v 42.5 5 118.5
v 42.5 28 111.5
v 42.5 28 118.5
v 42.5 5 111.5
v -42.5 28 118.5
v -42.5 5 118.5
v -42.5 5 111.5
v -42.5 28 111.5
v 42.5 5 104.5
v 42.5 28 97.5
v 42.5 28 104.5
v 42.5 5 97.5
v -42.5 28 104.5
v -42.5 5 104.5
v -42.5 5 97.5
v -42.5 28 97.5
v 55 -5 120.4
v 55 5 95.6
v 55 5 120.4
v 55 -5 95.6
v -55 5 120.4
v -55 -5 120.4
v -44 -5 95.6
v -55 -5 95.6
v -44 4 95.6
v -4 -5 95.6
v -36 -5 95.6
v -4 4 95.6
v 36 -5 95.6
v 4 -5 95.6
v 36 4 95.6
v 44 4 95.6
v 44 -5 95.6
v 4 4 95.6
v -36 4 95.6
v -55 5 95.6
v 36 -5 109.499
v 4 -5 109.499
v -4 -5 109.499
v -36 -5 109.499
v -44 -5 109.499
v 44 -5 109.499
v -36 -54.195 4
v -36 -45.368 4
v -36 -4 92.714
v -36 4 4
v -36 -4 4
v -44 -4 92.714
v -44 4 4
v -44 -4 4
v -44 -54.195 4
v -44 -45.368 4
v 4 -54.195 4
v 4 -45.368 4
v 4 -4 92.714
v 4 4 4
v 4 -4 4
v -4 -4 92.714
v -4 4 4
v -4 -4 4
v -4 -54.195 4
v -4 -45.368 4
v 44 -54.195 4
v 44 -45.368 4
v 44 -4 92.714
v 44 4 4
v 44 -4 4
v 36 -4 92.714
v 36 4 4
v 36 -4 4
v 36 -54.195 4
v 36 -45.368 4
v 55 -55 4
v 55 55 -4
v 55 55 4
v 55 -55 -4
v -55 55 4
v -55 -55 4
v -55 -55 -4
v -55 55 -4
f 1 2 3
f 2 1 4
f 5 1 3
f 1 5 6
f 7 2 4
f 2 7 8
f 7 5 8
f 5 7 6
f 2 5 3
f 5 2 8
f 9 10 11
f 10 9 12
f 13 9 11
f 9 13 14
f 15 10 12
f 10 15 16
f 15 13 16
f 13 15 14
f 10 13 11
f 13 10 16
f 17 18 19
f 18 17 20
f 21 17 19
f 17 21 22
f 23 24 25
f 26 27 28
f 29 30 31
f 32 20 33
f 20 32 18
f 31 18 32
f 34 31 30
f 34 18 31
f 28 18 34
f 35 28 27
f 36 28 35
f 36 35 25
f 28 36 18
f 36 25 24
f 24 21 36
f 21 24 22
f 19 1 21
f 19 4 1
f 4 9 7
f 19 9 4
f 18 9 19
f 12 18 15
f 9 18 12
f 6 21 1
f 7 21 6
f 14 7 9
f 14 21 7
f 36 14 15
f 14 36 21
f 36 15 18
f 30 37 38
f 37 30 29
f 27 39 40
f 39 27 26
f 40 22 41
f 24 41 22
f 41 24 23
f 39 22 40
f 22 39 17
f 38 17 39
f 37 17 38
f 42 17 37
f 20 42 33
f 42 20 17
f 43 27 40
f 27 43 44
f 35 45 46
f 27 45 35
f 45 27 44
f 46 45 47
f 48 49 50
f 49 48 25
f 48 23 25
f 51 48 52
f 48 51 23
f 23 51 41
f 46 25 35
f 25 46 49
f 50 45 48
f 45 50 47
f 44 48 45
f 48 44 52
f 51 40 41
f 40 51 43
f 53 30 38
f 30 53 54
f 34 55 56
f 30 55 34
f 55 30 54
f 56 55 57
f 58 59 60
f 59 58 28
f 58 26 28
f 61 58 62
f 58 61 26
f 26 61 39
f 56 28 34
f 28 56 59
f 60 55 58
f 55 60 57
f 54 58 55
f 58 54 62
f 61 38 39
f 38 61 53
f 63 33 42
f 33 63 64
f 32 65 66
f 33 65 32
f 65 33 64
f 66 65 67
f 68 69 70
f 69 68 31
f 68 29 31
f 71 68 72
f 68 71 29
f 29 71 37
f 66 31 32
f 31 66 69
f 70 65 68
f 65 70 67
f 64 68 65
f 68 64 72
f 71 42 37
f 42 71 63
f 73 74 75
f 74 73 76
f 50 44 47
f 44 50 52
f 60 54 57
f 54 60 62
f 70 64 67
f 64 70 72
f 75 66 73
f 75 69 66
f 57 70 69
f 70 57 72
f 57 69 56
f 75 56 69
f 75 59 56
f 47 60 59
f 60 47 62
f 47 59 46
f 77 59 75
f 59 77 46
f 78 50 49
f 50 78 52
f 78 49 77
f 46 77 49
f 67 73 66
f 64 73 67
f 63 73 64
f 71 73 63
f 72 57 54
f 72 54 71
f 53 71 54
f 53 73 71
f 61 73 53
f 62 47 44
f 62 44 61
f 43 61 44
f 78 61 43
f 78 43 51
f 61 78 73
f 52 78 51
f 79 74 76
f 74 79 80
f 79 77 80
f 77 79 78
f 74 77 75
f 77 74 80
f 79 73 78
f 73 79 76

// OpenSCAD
// file: ../robot_settings.scad
main_box_x = 95; // 96
main_box_y = 102;
main_box_z = 74; // 74.5
wall_thickness = 2;

rail_gap = 2;
rail_inset = 7;

rail_thickness = 7;
rail_length = 250;
rail_width = 200;

raspberry_pi_screw_seperation_y = 57;
raspberry_pi_screw_seperation_z = 48;
raspberry_pi_peg_h = 4;

gears_module = 1;
pinion_gear_teeth = 30;
pinion_gear_width = 5;
pinion_gear_bore = 4;

gears_setback_distance = 25;
gear_post_height = 2 * pinion_gear_width + rail_thickness + 8 ;

steering_motor_mount_x = 45;
steering_motor_mount_y = 36;
steering_motor_mount_z = 18;
steering_motor_mount_setback_distance = gears_setback_distance + 16;

dc_motor_drivertype = "Teyleten"; // Teyleten
isAdafruit = (dc_motor_drivertype == "Adafruit");

drv8871_x = isAdafruit ? 20.3 : 21.6;
drv8871_y = isAdafruit ?  24 : 25;

drv8871_z = 2;
drv8871_screw_d = 2.5;
drv8871_solder_points_z = 2;

drv8871mount_edge_x = 1.5;
drv8871mount_edge_wall = 3;
drv8871mount_z = 5;
drv8871mount_x = drv8871_x +  drv8871mount_edge_wall - 2* drv8871mount_edge_x;
drv8871mount_y = 19;

drv8871_screw_distance = 15.64;
drv8871_solder_points_d = 1.66;
drv8871_solder_offset_y = 4.4;
drv8871_solder_inner_points_distance = 5;
drv8871_solder_outer_points_distance = 12;

dc_motor_housing_minus_encoder_z = 48;
dc_motor_encoder_z = 9.33;
dc_motor_encoder_wheel_d = 13.4;
dc_motor_encoder_wheel_thickness = 5;
dc_motor_encoder_wheel_gap = 3;
dc_motor_encoder_circuit_thickness = 2;
dc_motor_cutout_d = 24.8;
dc_motor_cutout_z = 19.5;

dc_motor_screw_head_z = 2;
dc_motor_screw_head_d = 5.6;
dc_motor_screw_d = 3.2;
dc_motor_screw_offset = 8.5;

dc_motor_axle_ring_z = 3;
dc_motor_axle_ring_d = 7.2;
dc_motor_axle_cutout_d = 4.5;
dc_motor_axle_cutout_z = 10;
dc_motor_axle_notch_cutout = 0.4;
dc_motor_axle_notch_cutout_z = 6;

pdmount_x = 20;
pdmount_y = 30;
pdmount_z = 2;
pdmount_edge_x = 1.5;
pdmount_edge_wall = 3;

steering_shaft_z = gear_post_height + dc_motor_axle_ring_z + pinion_gear_width + 15;
steering_shaft_d = 7;
steering_shaft_motor_fitting_d = 9;

lidar_mount_y = 110;
lidar_mount_x = 65 + 20;
lidar_narrow_screws = 40;
lidar_wide_screws = 56;
lidar_front_to_back_screws = 70;
lidar_screw_d = 3;
lidar_circuitboard_x = 20;
lidar_circuitboard_y = 35;
lidar_circuitboard_z = 1.2;
lidar_cord_length = 29;

ball_bearing_height = 7;
ball_bearing_outer_diameter = 22;
ball_bearing_inner_diameter = 8;

pull_bar_radius = 3.3;

rack_module = 1;
rack_length = main_box_x / 2;
rack_height = 10;
rack_width = 10;
rack_teeth = 30;
rack_bore = 3;

// tire hardware
axle_length = 30;
axle_reciever_inner_diameter = 7.75;
axle_reciever_length = 18.8;
axle_notch_length = 7;
axle_notch_cutout = 2.4;

// power distribution bar
power_bar_cutout_x = 96;
power_bar_y = 19.1;
power_bar_z = 1.5;
power_bar_screw_distance = 91.4;
power_bar_screw_d = 2.8;
power_bar_standoff_z = 5;
power_bar_standoff_d = 6.83;

// breadboard
breadboard_wall_thickness = 3;
breadboard_width = 55;
breadboard_length = 83;
breadboard_height = 10.5;
breadboard_notch_width = 3.8;
breadboard_longside_notch_separation = 58.2 - breadboard_notch_width / 2;
breadboard_shortside_notch_separation = 26.3 - breadboard_notch_width;
// main file
   include <../robot_settings.scad>
   
   // front end jack
  
  // top bar
  translate([0, 0, 108])
  cube([110, 10, dc_motor_cutout_d], center = true);
  
   // left post
  translate([-40, 0, 54])
  cube([8,8,108], center = true);
  
  // left back support
  translate([-40,  -26, 55])
  rotate([-25, 0, 0])
  cube([8, 8, 120], center = true);
  
  // center post
  translate([0, 0, 108/2])
  cube([8,8, 108], center = true);
 
  // center back support 
  translate([0,  -26, 55])
  rotate([-25, 0, 0])
  cube([8, 8, 120], center = true);
  
  // center post
  translate([40, 0, 108/2])
  cube([8,8, 108], center = true);
 
  // center back support 
  translate([40,  -26, 55])
  rotate([-25, 0, 0])
  cube([8, 8, 120], center = true);
 
 // clam 
 translate([0, 16, 108])
  union() {
  translate([0,  0, rail_thickness])
  cube([lidar_mount_x,  24, rail_thickness], center = true);
  
  translate([0,  0, -rail_thickness])
  cube([lidar_mount_x,  24, rail_thickness], center = true);
  }


  // platform
  translate([0,  0, 0])
    cube([110, 110, 8], center = true);
